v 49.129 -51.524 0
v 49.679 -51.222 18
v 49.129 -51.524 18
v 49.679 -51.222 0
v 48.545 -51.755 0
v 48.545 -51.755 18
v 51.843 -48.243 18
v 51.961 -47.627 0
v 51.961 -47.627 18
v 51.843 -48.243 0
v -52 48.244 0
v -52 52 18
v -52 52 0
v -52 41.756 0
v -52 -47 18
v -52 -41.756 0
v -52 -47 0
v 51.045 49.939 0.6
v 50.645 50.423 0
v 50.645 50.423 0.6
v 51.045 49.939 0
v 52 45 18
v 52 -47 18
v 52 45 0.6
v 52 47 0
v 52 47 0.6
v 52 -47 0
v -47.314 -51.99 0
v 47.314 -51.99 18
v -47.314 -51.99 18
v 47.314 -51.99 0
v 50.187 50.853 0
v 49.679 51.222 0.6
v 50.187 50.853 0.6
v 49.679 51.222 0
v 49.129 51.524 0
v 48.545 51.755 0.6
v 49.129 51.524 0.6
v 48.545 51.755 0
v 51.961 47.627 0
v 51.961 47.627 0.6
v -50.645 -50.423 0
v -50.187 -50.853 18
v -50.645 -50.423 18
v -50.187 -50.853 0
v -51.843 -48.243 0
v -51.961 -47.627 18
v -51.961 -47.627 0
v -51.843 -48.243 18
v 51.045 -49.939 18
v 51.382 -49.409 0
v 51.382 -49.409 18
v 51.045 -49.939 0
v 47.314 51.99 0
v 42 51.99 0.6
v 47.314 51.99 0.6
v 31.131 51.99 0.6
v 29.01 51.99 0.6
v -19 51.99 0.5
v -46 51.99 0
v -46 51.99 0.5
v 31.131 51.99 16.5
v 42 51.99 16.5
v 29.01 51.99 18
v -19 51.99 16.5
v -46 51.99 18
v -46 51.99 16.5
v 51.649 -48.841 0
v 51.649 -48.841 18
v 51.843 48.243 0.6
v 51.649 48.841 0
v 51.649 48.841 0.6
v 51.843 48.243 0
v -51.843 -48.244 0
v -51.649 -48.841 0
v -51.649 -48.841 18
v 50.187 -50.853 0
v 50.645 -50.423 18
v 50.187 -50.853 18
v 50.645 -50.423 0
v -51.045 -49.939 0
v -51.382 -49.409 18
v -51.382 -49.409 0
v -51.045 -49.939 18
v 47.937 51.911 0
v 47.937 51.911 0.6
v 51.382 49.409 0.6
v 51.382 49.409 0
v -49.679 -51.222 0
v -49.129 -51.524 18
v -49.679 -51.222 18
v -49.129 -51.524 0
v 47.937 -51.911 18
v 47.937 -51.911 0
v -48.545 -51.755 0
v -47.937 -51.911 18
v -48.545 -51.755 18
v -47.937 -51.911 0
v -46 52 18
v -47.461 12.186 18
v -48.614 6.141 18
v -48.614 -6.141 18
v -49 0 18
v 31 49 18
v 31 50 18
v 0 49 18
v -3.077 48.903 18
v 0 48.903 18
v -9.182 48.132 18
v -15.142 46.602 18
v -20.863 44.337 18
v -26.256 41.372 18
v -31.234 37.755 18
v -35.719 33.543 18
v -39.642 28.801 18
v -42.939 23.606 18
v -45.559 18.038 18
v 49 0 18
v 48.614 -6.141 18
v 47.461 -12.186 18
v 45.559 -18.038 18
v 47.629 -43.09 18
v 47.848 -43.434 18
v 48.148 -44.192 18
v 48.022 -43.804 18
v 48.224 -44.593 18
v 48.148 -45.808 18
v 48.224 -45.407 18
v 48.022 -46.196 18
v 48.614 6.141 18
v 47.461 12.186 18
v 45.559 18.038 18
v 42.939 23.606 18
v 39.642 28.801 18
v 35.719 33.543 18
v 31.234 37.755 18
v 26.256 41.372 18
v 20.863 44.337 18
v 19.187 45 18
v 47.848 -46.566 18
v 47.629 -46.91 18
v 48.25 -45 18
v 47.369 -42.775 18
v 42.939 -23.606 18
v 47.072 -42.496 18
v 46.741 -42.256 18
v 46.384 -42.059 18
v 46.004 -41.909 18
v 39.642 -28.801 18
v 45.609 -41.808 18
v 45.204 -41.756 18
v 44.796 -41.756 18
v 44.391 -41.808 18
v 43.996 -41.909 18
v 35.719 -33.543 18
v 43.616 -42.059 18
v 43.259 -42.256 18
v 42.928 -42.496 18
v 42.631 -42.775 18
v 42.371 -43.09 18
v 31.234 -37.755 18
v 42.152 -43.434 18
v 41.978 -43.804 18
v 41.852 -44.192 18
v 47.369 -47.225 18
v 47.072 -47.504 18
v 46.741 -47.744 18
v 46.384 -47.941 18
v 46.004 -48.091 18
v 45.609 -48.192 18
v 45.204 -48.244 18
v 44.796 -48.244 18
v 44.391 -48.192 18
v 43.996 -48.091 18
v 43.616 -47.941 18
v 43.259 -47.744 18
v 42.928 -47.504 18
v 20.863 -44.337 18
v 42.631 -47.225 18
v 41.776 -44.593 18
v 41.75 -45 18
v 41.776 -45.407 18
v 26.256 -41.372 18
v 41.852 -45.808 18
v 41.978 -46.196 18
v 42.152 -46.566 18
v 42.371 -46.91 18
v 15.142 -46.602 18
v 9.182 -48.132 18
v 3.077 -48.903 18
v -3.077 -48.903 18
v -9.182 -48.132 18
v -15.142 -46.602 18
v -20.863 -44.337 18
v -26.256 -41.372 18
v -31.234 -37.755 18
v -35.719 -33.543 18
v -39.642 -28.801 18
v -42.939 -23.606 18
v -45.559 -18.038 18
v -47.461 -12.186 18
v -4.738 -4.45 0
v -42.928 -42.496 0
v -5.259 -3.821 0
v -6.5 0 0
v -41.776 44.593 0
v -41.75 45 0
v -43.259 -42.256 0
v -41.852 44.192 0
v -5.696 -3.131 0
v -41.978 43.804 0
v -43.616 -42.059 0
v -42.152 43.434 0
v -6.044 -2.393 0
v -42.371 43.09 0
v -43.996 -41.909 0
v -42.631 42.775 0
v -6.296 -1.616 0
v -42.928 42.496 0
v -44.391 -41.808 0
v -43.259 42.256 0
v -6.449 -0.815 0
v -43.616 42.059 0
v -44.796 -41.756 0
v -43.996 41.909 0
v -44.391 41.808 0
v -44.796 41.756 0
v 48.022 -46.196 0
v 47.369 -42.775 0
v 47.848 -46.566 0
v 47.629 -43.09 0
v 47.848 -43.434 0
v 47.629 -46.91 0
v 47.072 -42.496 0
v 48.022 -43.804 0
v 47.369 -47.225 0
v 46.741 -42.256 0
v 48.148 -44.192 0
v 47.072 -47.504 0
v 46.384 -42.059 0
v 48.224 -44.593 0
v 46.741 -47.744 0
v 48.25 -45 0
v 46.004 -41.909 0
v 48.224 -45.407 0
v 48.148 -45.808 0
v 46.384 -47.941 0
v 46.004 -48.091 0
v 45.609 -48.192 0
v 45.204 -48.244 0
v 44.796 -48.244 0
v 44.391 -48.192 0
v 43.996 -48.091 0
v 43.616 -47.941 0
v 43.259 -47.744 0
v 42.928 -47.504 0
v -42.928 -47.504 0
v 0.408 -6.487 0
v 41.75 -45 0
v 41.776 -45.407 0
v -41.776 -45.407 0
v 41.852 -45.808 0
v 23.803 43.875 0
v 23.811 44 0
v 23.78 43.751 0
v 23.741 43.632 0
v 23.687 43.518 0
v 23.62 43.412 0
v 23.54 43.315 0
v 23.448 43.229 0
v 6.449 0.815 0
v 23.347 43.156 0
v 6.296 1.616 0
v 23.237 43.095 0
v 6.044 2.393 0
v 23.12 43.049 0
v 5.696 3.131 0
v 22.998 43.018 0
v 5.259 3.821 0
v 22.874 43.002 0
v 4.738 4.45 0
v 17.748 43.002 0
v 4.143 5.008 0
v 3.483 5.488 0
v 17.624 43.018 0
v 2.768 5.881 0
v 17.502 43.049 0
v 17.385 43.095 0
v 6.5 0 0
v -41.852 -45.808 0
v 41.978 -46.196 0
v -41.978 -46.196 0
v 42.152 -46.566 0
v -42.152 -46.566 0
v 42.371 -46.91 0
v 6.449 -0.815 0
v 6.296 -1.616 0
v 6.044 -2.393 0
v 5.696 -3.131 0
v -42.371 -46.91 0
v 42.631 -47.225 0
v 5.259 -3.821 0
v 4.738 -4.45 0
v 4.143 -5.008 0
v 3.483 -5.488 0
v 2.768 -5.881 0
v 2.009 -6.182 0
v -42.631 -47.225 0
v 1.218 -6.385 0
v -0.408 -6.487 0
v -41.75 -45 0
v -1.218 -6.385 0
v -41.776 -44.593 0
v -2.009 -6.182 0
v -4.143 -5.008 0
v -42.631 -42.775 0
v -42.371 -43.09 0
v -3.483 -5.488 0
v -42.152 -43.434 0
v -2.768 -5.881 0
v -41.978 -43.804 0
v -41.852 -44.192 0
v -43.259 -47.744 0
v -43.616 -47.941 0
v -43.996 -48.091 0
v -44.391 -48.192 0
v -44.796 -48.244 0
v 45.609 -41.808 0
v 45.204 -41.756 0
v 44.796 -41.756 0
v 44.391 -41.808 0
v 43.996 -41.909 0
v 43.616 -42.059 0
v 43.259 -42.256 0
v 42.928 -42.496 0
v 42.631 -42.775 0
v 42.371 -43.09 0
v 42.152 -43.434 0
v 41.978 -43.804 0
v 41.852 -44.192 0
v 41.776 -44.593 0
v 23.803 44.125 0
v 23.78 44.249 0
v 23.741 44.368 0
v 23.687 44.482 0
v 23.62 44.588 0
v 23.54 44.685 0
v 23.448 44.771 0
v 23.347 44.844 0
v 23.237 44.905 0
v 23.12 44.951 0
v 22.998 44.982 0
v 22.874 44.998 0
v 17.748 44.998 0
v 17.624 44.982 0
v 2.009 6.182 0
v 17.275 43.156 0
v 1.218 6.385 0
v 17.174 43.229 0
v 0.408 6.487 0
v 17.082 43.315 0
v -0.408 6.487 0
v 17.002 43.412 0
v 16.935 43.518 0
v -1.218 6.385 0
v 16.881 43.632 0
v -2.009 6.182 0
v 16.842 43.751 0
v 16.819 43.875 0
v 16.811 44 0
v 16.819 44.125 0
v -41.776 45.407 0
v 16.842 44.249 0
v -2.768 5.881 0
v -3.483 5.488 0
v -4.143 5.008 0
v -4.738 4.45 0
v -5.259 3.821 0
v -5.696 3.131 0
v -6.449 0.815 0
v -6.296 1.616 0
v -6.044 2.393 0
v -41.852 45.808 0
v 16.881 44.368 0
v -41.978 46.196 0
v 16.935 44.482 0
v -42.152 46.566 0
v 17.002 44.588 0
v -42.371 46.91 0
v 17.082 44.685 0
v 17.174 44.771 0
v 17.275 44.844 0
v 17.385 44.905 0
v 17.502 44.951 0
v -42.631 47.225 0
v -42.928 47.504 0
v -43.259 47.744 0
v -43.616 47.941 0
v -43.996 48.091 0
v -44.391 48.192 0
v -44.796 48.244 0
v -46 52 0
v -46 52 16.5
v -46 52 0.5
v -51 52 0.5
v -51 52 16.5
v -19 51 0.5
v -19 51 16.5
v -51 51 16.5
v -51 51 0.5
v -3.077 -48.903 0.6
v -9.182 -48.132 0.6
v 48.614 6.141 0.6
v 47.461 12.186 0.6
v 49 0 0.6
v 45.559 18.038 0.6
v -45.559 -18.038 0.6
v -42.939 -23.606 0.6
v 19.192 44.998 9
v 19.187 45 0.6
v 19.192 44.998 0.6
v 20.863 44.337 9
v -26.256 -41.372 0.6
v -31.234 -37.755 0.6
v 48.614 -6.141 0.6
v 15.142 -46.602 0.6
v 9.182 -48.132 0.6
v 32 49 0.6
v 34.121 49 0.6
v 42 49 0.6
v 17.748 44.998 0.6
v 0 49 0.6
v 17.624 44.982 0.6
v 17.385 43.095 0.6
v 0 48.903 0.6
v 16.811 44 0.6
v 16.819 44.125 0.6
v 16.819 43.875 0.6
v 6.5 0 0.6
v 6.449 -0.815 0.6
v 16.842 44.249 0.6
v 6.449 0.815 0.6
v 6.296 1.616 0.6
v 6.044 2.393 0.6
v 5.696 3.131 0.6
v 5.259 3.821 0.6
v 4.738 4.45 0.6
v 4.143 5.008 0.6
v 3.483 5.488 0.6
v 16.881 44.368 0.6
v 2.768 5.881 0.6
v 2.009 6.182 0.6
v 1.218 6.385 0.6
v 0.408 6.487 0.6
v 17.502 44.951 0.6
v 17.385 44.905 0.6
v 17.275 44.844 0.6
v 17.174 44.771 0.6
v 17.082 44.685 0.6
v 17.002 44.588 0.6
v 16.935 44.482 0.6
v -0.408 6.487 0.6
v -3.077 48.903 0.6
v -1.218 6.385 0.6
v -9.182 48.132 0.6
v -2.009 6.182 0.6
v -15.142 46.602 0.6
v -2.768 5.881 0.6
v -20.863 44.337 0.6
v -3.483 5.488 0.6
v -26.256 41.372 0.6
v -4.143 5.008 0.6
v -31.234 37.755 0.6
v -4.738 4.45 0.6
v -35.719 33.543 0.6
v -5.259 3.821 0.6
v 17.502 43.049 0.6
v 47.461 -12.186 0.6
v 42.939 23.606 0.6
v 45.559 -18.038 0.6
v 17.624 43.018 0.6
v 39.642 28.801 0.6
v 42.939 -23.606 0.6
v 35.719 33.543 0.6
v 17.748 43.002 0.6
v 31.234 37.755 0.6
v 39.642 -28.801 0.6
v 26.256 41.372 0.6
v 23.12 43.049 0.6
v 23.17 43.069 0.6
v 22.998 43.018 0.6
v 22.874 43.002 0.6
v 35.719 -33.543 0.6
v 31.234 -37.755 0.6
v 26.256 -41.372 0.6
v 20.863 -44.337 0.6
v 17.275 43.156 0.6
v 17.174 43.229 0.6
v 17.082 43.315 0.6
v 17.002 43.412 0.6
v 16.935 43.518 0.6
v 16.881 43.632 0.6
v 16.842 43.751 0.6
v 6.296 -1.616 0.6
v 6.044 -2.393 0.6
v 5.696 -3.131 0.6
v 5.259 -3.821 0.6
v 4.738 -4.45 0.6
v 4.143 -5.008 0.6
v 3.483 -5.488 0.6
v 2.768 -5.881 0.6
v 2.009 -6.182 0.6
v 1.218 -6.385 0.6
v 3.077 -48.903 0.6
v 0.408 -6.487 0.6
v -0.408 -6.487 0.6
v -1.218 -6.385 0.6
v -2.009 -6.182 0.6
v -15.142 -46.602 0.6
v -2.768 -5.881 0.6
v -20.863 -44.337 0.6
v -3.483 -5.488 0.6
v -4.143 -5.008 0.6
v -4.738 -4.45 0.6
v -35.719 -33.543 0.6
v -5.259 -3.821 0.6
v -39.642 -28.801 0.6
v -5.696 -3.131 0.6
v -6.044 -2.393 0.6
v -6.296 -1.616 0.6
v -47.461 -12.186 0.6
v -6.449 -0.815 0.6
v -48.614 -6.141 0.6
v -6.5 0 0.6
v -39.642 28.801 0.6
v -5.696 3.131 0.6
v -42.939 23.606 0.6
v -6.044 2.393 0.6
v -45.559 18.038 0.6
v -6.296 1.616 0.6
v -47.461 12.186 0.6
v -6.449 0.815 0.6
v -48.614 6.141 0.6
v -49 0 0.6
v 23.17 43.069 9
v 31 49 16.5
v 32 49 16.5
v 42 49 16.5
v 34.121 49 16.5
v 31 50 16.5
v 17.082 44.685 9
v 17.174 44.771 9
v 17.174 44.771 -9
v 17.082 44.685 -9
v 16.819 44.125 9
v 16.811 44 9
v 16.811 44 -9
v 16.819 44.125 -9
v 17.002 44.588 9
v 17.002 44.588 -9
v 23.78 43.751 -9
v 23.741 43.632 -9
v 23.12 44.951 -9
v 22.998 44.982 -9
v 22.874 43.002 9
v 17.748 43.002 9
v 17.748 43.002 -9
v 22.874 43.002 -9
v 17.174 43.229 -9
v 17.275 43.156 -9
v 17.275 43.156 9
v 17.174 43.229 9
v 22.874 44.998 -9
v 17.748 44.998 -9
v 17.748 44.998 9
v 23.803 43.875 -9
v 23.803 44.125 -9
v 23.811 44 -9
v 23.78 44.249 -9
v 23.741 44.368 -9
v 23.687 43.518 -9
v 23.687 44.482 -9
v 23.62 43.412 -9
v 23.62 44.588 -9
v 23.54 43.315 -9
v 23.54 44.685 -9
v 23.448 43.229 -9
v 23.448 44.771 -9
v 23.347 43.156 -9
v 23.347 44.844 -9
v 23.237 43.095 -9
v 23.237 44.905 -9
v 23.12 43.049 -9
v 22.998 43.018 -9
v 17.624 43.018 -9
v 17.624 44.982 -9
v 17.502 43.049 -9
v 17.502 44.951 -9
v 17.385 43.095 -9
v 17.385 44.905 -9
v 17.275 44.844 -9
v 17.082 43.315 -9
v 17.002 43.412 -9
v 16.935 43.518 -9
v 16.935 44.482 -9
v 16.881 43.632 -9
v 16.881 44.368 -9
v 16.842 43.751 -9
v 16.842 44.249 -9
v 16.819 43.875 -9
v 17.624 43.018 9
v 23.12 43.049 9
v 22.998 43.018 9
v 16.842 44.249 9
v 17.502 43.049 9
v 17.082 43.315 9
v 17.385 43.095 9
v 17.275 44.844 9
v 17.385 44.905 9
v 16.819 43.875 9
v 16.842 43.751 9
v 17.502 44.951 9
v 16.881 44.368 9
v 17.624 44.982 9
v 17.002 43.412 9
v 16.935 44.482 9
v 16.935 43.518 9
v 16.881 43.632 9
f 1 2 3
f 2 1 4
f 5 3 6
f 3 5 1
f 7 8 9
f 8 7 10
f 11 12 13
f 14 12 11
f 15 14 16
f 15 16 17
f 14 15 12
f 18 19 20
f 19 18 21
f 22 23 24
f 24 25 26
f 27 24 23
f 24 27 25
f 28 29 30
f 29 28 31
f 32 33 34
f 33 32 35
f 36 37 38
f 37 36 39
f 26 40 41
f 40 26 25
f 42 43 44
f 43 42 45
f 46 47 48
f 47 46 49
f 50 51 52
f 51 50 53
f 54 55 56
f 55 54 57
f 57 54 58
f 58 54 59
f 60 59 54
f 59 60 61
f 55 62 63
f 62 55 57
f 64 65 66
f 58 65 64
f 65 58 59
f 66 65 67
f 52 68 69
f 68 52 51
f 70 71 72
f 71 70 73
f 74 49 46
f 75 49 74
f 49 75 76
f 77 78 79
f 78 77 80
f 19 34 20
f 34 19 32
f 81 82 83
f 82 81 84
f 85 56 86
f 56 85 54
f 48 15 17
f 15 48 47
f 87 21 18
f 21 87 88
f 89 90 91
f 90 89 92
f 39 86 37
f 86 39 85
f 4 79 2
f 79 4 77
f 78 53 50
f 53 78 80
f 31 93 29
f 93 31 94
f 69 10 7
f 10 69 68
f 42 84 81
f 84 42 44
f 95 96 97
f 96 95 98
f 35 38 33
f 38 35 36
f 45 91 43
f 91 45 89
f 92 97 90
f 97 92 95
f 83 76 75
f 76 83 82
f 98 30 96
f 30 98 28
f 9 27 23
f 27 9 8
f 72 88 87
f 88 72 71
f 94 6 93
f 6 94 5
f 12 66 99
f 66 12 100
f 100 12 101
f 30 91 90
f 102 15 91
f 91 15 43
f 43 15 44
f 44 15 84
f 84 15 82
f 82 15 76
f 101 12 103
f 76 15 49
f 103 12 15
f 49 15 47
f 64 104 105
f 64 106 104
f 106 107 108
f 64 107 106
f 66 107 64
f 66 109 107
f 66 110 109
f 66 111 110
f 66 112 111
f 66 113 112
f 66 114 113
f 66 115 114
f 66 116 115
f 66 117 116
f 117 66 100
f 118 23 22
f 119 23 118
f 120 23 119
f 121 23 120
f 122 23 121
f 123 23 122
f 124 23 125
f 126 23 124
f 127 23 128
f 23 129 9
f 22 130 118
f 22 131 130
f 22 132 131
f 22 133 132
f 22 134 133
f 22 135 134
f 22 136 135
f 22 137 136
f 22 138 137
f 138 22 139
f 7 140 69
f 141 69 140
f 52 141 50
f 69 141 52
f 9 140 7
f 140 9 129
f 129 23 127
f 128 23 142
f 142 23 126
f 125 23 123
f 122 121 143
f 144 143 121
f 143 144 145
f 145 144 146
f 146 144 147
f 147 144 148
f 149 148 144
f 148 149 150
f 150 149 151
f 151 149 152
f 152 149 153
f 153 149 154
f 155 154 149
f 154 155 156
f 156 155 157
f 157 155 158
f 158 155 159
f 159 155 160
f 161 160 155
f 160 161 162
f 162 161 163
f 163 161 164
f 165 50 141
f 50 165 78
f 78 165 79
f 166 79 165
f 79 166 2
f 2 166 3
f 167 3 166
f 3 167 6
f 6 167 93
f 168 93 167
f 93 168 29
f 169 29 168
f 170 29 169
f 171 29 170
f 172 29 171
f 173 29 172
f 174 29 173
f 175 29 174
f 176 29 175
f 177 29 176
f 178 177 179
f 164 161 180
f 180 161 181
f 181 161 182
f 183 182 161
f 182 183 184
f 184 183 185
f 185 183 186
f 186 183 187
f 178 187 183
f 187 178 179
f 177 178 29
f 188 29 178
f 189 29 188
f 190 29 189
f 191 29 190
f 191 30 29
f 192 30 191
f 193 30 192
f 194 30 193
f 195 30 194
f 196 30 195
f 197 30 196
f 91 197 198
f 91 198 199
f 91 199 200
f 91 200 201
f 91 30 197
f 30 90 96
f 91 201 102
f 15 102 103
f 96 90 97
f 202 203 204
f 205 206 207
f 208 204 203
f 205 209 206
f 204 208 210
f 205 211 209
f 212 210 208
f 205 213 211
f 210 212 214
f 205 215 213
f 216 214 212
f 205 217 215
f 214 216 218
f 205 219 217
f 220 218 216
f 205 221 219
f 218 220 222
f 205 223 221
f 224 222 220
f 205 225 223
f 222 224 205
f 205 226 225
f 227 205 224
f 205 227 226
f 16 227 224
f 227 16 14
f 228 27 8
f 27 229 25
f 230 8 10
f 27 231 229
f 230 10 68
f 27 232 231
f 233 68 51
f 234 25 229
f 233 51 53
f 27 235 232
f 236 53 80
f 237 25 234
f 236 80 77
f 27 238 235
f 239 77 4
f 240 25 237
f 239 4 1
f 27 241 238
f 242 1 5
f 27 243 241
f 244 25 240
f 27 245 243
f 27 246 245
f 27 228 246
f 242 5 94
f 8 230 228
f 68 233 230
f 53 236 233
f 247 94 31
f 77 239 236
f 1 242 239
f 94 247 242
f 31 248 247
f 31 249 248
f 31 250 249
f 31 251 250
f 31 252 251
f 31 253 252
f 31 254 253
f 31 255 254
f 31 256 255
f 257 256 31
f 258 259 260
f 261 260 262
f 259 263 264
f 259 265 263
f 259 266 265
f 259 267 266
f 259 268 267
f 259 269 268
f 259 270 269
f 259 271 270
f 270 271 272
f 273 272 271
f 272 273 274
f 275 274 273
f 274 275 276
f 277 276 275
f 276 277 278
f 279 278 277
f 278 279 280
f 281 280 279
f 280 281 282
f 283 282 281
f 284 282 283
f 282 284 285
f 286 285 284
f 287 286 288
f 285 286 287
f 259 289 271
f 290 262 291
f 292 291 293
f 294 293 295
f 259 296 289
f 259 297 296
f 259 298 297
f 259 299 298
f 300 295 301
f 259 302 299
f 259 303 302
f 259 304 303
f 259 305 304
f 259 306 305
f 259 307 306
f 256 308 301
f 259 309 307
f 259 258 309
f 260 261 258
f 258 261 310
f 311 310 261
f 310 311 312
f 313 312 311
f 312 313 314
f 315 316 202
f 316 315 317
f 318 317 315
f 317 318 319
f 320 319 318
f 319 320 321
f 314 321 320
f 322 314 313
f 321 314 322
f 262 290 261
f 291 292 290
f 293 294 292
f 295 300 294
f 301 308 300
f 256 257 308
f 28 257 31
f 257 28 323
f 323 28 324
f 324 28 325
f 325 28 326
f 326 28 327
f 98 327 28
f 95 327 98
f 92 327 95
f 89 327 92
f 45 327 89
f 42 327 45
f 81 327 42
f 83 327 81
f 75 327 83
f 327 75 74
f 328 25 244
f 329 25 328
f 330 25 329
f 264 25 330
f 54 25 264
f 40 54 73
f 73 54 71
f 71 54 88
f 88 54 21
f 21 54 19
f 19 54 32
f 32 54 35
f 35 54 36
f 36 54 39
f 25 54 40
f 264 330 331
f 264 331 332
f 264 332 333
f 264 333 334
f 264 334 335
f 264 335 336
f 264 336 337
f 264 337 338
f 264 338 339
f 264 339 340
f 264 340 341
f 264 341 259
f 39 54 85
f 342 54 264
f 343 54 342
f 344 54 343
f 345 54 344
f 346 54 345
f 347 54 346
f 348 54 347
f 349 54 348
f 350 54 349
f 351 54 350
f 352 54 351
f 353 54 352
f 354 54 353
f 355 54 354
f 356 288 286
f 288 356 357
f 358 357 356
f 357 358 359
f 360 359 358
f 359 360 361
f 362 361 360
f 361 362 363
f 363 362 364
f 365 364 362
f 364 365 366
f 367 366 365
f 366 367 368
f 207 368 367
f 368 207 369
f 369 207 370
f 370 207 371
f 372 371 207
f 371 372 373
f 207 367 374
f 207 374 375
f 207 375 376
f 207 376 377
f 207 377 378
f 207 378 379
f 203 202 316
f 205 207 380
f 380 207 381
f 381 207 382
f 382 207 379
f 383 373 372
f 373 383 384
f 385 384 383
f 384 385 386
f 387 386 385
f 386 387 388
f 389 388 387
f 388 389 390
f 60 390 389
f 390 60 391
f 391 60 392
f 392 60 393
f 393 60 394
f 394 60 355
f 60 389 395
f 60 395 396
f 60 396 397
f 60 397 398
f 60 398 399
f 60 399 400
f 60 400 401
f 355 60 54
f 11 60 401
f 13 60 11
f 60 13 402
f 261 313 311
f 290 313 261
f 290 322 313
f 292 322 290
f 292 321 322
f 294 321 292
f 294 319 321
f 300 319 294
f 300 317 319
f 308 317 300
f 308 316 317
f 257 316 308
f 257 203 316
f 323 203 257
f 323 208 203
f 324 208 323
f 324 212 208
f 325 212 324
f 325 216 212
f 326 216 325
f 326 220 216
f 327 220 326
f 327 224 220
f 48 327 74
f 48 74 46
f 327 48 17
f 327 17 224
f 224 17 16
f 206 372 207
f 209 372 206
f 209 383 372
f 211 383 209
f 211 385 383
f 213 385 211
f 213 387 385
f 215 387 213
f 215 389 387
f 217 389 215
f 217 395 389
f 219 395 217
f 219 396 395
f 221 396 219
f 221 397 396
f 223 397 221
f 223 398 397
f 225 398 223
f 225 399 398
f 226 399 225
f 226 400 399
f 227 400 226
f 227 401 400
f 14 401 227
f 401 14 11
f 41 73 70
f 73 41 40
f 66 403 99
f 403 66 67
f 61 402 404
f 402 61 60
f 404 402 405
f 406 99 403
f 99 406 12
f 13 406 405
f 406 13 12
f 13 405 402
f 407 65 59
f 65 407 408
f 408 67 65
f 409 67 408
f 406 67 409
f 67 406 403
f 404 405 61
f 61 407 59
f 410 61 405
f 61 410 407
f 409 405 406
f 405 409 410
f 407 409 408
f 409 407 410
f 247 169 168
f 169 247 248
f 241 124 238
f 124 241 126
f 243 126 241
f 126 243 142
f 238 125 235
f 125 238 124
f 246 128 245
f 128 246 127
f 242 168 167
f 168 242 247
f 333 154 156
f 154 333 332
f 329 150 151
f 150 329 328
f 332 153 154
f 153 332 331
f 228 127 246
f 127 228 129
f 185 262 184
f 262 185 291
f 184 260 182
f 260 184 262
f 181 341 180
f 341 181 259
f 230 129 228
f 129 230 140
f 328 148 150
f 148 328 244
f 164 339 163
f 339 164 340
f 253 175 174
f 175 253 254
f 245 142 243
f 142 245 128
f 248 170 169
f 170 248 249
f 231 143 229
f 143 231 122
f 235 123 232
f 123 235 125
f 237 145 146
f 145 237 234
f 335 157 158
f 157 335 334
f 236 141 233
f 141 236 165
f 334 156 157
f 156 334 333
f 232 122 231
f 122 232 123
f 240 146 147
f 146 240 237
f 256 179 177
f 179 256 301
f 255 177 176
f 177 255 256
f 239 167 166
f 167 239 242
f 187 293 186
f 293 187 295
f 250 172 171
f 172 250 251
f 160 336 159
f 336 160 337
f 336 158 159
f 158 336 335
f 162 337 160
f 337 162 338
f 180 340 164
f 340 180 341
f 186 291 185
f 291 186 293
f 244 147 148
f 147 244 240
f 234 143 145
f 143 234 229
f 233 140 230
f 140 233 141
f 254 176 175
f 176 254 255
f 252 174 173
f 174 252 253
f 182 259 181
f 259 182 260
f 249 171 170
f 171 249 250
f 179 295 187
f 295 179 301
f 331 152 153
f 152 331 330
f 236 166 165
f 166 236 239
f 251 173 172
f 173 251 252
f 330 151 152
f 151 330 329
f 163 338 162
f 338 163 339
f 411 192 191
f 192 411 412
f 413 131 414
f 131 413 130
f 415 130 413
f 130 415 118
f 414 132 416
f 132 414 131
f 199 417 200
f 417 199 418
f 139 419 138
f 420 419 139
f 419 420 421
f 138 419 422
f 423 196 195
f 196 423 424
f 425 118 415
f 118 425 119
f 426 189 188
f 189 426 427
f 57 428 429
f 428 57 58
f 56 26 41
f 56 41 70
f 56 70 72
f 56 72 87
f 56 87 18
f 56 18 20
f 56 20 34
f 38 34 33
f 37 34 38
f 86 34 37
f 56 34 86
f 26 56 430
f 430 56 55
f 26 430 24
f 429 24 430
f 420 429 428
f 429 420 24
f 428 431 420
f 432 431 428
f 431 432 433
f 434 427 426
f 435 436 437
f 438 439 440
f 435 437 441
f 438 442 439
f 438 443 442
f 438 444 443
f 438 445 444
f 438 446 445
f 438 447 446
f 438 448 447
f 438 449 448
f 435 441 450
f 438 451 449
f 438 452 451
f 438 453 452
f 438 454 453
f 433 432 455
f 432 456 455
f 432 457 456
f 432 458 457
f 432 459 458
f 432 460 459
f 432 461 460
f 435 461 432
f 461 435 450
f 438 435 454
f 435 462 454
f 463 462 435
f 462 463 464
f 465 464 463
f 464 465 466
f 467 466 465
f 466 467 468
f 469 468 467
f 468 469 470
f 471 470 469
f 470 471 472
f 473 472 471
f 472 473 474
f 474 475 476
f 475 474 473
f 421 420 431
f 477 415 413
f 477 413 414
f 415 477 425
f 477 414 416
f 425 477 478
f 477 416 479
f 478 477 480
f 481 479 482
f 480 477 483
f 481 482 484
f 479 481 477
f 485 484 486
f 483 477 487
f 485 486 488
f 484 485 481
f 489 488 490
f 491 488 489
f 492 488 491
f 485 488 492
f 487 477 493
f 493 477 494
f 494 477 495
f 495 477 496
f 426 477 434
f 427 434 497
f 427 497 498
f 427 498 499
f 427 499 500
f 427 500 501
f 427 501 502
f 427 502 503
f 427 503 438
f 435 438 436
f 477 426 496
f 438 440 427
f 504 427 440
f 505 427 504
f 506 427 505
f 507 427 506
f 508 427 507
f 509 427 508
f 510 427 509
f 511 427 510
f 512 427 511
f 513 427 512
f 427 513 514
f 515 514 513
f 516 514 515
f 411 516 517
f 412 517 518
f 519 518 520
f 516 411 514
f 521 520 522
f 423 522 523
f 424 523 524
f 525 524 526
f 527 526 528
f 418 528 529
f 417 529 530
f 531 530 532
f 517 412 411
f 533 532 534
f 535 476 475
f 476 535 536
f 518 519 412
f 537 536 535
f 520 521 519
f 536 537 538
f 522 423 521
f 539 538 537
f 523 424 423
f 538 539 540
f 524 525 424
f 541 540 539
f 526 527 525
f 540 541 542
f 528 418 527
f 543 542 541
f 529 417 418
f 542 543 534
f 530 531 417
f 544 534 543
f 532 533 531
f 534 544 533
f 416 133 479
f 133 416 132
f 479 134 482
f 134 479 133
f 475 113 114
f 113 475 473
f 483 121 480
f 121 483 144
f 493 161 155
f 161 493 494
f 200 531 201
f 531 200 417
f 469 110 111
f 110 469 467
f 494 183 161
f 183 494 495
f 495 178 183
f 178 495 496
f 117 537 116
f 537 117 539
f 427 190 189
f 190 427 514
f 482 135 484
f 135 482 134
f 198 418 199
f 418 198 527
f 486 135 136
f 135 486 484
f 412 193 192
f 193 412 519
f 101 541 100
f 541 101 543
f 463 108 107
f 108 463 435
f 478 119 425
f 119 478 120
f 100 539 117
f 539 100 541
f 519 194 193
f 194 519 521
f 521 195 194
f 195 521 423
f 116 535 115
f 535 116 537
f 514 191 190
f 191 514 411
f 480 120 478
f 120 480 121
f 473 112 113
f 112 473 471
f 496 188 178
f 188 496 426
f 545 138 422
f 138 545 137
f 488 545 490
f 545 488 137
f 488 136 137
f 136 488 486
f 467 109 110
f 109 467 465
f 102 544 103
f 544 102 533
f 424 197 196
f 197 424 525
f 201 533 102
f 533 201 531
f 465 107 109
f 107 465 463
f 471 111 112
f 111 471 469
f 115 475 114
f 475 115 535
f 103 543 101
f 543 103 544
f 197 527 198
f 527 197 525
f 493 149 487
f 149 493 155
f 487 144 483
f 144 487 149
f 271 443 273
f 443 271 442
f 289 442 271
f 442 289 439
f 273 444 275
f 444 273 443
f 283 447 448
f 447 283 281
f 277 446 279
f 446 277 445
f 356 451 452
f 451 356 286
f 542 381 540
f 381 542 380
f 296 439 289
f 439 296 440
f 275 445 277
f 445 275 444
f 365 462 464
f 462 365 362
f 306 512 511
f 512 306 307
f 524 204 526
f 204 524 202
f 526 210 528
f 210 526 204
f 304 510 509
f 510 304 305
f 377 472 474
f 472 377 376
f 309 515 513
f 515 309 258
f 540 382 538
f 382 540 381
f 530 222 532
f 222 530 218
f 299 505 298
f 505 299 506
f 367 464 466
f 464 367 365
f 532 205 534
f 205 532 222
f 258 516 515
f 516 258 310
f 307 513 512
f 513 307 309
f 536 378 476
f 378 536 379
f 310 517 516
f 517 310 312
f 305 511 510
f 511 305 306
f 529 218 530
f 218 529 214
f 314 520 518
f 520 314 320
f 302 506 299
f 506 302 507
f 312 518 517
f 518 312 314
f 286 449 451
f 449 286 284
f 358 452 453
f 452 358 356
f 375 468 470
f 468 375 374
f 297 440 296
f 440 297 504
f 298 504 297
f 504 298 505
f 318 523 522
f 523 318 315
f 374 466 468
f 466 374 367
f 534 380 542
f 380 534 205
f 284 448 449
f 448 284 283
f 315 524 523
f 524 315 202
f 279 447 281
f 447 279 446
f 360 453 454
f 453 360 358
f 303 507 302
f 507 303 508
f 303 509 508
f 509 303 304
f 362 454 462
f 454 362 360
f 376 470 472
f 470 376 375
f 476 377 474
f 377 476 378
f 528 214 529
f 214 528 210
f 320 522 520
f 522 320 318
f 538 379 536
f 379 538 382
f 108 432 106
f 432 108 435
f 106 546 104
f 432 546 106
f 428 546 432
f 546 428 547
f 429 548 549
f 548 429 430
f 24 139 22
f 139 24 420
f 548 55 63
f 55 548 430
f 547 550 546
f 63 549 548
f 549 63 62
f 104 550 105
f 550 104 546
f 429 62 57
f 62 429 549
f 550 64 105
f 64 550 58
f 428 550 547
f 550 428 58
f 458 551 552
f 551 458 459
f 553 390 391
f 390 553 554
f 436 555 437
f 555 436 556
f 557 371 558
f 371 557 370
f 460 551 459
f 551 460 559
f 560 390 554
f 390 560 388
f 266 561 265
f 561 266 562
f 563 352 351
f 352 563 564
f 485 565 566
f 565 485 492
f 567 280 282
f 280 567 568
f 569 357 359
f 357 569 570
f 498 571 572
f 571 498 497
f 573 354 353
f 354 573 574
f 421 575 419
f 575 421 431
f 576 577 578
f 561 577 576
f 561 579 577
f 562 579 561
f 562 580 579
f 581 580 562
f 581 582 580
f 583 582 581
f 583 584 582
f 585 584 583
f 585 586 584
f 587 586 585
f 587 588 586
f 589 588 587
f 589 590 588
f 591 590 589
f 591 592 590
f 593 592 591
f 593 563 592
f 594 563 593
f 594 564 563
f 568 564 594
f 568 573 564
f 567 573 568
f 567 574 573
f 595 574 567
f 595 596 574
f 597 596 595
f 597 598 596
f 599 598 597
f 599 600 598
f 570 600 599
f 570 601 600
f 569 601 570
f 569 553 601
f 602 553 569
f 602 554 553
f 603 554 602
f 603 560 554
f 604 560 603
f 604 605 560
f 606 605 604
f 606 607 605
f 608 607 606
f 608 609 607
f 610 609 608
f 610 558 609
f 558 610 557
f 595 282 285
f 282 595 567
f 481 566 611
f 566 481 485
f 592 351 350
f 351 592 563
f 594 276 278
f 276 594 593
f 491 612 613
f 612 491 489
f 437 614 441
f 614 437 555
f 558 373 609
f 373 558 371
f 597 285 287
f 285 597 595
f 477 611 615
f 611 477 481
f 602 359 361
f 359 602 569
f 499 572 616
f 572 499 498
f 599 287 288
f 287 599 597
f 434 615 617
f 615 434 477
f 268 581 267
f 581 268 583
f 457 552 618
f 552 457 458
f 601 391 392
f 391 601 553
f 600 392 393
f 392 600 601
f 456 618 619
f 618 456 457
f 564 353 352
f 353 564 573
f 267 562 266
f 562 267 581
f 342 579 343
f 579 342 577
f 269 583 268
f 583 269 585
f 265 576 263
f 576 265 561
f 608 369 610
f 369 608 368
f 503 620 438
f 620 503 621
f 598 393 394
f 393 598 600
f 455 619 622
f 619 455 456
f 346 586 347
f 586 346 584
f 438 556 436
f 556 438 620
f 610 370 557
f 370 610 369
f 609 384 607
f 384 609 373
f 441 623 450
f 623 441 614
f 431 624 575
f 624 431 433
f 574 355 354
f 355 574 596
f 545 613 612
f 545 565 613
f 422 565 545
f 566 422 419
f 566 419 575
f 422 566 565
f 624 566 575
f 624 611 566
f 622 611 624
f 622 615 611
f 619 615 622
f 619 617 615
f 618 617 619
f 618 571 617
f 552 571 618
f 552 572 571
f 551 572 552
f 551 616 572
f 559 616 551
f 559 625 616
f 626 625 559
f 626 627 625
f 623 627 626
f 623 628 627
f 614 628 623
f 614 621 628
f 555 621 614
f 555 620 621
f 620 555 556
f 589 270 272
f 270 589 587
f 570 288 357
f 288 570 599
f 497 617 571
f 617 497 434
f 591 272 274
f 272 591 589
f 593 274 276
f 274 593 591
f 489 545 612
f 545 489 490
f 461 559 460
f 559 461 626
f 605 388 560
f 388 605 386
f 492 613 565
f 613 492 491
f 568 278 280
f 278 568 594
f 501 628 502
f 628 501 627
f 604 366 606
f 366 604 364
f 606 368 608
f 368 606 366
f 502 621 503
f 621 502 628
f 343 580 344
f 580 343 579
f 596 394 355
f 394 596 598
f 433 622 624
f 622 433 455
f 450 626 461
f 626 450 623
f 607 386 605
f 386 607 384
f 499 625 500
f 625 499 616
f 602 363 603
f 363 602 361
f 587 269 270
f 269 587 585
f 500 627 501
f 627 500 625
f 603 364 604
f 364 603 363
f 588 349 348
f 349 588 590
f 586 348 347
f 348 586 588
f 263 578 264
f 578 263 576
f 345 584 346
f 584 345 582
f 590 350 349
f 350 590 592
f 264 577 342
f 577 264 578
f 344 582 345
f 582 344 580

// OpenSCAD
$fn = 50;


union() {
	difference() {
		union() {
			hull() {
				translate(v = [-47.0000000000, 47.0000000000, 0]) {
					cylinder(h = 18, r = 5);
				}
				translate(v = [47.0000000000, 47.0000000000, 0]) {
					cylinder(h = 18, r = 5);
				}
				translate(v = [-47.0000000000, -47.0000000000, 0]) {
					cylinder(h = 18, r = 5);
				}
				translate(v = [47.0000000000, -47.0000000000, 0]) {
					cylinder(h = 18, r = 5);
				}
			}
			translate(v = [-52.0000000000, 46.0000000000, 0]) {
				cube(size = [6, 6, 18]);
			}
		}
		union() {
			translate(v = [-52.5000000000, -45.0000000000, -250.0000000000]) {
				rotate(a = [0, 0, 0]) {
					difference() {
						union() {
							hull() {
								translate(v = [7.5000000000, 0, 0]) {
									cylinder(h = 250, r = 3.2500000000, r1 = 3.2500000000, r2 = 3.2500000000);
								}
								translate(v = [-7.5000000000, 0, 0]) {
									cylinder(h = 250, r = 3.2500000000, r1 = 3.2500000000, r2 = 3.2500000000);
								}
							}
						}
						union();
					}
				}
			}
			translate(v = [-52.5000000000, 45.0000000000, -250.0000000000]) {
				rotate(a = [0, 0, 0]) {
					difference() {
						union() {
							hull() {
								translate(v = [7.5000000000, 0, 0]) {
									cylinder(h = 250, r = 3.2500000000, r1 = 3.2500000000, r2 = 3.2500000000);
								}
								translate(v = [-7.5000000000, 0, 0]) {
									cylinder(h = 250, r = 3.2500000000, r1 = 3.2500000000, r2 = 3.2500000000);
								}
							}
						}
						union();
					}
				}
			}
			translate(v = [-51.0000000000, 51.0000000000, 0.5000000000]) {
				cube(size = [32, 1, 16]);
			}
			translate(v = [45.0000000000, -45.0000000000, 0]) {
				cylinder(h = 100, r = 3.2500000000);
			}
			translate(v = [0, 0, 0.6000000000]) {
				cylinder(h = 20.4000000000, r = 49.0000000000);
			}
			translate(v = [0, 0, -9.0000000000]) {
				cylinder(h = 18, r = 6.5000000000);
			}
			translate(v = [0.0000000000, 45.0000000000, 0.6000000000]) {
				cube(size = [52.0000000000, 4, 20.4000000000]);
			}
			translate(v = [42.0000000000, 45.0000000000, 0.6000000000]) {
				cube(size = [10, 7, 20.4000000000]);
			}
			translate(v = [31.0000000000, 45.0000000000, 16.5000000000]) {
				cube(size = [21, 7, 1.5000000000]);
			}
			translate(v = [28.2500000000, 52.7500000000, 0.6000000000]) {
				rotate(a = [0, 0, -45]) {
					cube(size = [7.5000000000, 1.5000000000, 20.4000000000]);
				}
			}
			translate(v = [11.0610000000, 43.0000000000, 0.6000000000]) {
				cube(size = [7.5000000000, 2, 17.4000000000]);
			}
		}
	}
	union() {
		translate(v = [20.3110000000, 44.0000000000, -9.0000000000]) {
			rotate(a = [0, 0, 0]) {
				difference() {
					union() {
						#hull() {
							#translate(v = [2.5000000000, 0, 0]) {
								cylinder(h = 18, r = 1.0000000000, r1 = 1.0000000000, r2 = 1.0000000000);
							}
							#translate(v = [-2.5000000000, 0, 0]) {
								cylinder(h = 18, r = 1.0000000000, r1 = 1.0000000000, r2 = 1.0000000000);
							}
						}
					}
					union();
				}
			}
		}
	}
}
